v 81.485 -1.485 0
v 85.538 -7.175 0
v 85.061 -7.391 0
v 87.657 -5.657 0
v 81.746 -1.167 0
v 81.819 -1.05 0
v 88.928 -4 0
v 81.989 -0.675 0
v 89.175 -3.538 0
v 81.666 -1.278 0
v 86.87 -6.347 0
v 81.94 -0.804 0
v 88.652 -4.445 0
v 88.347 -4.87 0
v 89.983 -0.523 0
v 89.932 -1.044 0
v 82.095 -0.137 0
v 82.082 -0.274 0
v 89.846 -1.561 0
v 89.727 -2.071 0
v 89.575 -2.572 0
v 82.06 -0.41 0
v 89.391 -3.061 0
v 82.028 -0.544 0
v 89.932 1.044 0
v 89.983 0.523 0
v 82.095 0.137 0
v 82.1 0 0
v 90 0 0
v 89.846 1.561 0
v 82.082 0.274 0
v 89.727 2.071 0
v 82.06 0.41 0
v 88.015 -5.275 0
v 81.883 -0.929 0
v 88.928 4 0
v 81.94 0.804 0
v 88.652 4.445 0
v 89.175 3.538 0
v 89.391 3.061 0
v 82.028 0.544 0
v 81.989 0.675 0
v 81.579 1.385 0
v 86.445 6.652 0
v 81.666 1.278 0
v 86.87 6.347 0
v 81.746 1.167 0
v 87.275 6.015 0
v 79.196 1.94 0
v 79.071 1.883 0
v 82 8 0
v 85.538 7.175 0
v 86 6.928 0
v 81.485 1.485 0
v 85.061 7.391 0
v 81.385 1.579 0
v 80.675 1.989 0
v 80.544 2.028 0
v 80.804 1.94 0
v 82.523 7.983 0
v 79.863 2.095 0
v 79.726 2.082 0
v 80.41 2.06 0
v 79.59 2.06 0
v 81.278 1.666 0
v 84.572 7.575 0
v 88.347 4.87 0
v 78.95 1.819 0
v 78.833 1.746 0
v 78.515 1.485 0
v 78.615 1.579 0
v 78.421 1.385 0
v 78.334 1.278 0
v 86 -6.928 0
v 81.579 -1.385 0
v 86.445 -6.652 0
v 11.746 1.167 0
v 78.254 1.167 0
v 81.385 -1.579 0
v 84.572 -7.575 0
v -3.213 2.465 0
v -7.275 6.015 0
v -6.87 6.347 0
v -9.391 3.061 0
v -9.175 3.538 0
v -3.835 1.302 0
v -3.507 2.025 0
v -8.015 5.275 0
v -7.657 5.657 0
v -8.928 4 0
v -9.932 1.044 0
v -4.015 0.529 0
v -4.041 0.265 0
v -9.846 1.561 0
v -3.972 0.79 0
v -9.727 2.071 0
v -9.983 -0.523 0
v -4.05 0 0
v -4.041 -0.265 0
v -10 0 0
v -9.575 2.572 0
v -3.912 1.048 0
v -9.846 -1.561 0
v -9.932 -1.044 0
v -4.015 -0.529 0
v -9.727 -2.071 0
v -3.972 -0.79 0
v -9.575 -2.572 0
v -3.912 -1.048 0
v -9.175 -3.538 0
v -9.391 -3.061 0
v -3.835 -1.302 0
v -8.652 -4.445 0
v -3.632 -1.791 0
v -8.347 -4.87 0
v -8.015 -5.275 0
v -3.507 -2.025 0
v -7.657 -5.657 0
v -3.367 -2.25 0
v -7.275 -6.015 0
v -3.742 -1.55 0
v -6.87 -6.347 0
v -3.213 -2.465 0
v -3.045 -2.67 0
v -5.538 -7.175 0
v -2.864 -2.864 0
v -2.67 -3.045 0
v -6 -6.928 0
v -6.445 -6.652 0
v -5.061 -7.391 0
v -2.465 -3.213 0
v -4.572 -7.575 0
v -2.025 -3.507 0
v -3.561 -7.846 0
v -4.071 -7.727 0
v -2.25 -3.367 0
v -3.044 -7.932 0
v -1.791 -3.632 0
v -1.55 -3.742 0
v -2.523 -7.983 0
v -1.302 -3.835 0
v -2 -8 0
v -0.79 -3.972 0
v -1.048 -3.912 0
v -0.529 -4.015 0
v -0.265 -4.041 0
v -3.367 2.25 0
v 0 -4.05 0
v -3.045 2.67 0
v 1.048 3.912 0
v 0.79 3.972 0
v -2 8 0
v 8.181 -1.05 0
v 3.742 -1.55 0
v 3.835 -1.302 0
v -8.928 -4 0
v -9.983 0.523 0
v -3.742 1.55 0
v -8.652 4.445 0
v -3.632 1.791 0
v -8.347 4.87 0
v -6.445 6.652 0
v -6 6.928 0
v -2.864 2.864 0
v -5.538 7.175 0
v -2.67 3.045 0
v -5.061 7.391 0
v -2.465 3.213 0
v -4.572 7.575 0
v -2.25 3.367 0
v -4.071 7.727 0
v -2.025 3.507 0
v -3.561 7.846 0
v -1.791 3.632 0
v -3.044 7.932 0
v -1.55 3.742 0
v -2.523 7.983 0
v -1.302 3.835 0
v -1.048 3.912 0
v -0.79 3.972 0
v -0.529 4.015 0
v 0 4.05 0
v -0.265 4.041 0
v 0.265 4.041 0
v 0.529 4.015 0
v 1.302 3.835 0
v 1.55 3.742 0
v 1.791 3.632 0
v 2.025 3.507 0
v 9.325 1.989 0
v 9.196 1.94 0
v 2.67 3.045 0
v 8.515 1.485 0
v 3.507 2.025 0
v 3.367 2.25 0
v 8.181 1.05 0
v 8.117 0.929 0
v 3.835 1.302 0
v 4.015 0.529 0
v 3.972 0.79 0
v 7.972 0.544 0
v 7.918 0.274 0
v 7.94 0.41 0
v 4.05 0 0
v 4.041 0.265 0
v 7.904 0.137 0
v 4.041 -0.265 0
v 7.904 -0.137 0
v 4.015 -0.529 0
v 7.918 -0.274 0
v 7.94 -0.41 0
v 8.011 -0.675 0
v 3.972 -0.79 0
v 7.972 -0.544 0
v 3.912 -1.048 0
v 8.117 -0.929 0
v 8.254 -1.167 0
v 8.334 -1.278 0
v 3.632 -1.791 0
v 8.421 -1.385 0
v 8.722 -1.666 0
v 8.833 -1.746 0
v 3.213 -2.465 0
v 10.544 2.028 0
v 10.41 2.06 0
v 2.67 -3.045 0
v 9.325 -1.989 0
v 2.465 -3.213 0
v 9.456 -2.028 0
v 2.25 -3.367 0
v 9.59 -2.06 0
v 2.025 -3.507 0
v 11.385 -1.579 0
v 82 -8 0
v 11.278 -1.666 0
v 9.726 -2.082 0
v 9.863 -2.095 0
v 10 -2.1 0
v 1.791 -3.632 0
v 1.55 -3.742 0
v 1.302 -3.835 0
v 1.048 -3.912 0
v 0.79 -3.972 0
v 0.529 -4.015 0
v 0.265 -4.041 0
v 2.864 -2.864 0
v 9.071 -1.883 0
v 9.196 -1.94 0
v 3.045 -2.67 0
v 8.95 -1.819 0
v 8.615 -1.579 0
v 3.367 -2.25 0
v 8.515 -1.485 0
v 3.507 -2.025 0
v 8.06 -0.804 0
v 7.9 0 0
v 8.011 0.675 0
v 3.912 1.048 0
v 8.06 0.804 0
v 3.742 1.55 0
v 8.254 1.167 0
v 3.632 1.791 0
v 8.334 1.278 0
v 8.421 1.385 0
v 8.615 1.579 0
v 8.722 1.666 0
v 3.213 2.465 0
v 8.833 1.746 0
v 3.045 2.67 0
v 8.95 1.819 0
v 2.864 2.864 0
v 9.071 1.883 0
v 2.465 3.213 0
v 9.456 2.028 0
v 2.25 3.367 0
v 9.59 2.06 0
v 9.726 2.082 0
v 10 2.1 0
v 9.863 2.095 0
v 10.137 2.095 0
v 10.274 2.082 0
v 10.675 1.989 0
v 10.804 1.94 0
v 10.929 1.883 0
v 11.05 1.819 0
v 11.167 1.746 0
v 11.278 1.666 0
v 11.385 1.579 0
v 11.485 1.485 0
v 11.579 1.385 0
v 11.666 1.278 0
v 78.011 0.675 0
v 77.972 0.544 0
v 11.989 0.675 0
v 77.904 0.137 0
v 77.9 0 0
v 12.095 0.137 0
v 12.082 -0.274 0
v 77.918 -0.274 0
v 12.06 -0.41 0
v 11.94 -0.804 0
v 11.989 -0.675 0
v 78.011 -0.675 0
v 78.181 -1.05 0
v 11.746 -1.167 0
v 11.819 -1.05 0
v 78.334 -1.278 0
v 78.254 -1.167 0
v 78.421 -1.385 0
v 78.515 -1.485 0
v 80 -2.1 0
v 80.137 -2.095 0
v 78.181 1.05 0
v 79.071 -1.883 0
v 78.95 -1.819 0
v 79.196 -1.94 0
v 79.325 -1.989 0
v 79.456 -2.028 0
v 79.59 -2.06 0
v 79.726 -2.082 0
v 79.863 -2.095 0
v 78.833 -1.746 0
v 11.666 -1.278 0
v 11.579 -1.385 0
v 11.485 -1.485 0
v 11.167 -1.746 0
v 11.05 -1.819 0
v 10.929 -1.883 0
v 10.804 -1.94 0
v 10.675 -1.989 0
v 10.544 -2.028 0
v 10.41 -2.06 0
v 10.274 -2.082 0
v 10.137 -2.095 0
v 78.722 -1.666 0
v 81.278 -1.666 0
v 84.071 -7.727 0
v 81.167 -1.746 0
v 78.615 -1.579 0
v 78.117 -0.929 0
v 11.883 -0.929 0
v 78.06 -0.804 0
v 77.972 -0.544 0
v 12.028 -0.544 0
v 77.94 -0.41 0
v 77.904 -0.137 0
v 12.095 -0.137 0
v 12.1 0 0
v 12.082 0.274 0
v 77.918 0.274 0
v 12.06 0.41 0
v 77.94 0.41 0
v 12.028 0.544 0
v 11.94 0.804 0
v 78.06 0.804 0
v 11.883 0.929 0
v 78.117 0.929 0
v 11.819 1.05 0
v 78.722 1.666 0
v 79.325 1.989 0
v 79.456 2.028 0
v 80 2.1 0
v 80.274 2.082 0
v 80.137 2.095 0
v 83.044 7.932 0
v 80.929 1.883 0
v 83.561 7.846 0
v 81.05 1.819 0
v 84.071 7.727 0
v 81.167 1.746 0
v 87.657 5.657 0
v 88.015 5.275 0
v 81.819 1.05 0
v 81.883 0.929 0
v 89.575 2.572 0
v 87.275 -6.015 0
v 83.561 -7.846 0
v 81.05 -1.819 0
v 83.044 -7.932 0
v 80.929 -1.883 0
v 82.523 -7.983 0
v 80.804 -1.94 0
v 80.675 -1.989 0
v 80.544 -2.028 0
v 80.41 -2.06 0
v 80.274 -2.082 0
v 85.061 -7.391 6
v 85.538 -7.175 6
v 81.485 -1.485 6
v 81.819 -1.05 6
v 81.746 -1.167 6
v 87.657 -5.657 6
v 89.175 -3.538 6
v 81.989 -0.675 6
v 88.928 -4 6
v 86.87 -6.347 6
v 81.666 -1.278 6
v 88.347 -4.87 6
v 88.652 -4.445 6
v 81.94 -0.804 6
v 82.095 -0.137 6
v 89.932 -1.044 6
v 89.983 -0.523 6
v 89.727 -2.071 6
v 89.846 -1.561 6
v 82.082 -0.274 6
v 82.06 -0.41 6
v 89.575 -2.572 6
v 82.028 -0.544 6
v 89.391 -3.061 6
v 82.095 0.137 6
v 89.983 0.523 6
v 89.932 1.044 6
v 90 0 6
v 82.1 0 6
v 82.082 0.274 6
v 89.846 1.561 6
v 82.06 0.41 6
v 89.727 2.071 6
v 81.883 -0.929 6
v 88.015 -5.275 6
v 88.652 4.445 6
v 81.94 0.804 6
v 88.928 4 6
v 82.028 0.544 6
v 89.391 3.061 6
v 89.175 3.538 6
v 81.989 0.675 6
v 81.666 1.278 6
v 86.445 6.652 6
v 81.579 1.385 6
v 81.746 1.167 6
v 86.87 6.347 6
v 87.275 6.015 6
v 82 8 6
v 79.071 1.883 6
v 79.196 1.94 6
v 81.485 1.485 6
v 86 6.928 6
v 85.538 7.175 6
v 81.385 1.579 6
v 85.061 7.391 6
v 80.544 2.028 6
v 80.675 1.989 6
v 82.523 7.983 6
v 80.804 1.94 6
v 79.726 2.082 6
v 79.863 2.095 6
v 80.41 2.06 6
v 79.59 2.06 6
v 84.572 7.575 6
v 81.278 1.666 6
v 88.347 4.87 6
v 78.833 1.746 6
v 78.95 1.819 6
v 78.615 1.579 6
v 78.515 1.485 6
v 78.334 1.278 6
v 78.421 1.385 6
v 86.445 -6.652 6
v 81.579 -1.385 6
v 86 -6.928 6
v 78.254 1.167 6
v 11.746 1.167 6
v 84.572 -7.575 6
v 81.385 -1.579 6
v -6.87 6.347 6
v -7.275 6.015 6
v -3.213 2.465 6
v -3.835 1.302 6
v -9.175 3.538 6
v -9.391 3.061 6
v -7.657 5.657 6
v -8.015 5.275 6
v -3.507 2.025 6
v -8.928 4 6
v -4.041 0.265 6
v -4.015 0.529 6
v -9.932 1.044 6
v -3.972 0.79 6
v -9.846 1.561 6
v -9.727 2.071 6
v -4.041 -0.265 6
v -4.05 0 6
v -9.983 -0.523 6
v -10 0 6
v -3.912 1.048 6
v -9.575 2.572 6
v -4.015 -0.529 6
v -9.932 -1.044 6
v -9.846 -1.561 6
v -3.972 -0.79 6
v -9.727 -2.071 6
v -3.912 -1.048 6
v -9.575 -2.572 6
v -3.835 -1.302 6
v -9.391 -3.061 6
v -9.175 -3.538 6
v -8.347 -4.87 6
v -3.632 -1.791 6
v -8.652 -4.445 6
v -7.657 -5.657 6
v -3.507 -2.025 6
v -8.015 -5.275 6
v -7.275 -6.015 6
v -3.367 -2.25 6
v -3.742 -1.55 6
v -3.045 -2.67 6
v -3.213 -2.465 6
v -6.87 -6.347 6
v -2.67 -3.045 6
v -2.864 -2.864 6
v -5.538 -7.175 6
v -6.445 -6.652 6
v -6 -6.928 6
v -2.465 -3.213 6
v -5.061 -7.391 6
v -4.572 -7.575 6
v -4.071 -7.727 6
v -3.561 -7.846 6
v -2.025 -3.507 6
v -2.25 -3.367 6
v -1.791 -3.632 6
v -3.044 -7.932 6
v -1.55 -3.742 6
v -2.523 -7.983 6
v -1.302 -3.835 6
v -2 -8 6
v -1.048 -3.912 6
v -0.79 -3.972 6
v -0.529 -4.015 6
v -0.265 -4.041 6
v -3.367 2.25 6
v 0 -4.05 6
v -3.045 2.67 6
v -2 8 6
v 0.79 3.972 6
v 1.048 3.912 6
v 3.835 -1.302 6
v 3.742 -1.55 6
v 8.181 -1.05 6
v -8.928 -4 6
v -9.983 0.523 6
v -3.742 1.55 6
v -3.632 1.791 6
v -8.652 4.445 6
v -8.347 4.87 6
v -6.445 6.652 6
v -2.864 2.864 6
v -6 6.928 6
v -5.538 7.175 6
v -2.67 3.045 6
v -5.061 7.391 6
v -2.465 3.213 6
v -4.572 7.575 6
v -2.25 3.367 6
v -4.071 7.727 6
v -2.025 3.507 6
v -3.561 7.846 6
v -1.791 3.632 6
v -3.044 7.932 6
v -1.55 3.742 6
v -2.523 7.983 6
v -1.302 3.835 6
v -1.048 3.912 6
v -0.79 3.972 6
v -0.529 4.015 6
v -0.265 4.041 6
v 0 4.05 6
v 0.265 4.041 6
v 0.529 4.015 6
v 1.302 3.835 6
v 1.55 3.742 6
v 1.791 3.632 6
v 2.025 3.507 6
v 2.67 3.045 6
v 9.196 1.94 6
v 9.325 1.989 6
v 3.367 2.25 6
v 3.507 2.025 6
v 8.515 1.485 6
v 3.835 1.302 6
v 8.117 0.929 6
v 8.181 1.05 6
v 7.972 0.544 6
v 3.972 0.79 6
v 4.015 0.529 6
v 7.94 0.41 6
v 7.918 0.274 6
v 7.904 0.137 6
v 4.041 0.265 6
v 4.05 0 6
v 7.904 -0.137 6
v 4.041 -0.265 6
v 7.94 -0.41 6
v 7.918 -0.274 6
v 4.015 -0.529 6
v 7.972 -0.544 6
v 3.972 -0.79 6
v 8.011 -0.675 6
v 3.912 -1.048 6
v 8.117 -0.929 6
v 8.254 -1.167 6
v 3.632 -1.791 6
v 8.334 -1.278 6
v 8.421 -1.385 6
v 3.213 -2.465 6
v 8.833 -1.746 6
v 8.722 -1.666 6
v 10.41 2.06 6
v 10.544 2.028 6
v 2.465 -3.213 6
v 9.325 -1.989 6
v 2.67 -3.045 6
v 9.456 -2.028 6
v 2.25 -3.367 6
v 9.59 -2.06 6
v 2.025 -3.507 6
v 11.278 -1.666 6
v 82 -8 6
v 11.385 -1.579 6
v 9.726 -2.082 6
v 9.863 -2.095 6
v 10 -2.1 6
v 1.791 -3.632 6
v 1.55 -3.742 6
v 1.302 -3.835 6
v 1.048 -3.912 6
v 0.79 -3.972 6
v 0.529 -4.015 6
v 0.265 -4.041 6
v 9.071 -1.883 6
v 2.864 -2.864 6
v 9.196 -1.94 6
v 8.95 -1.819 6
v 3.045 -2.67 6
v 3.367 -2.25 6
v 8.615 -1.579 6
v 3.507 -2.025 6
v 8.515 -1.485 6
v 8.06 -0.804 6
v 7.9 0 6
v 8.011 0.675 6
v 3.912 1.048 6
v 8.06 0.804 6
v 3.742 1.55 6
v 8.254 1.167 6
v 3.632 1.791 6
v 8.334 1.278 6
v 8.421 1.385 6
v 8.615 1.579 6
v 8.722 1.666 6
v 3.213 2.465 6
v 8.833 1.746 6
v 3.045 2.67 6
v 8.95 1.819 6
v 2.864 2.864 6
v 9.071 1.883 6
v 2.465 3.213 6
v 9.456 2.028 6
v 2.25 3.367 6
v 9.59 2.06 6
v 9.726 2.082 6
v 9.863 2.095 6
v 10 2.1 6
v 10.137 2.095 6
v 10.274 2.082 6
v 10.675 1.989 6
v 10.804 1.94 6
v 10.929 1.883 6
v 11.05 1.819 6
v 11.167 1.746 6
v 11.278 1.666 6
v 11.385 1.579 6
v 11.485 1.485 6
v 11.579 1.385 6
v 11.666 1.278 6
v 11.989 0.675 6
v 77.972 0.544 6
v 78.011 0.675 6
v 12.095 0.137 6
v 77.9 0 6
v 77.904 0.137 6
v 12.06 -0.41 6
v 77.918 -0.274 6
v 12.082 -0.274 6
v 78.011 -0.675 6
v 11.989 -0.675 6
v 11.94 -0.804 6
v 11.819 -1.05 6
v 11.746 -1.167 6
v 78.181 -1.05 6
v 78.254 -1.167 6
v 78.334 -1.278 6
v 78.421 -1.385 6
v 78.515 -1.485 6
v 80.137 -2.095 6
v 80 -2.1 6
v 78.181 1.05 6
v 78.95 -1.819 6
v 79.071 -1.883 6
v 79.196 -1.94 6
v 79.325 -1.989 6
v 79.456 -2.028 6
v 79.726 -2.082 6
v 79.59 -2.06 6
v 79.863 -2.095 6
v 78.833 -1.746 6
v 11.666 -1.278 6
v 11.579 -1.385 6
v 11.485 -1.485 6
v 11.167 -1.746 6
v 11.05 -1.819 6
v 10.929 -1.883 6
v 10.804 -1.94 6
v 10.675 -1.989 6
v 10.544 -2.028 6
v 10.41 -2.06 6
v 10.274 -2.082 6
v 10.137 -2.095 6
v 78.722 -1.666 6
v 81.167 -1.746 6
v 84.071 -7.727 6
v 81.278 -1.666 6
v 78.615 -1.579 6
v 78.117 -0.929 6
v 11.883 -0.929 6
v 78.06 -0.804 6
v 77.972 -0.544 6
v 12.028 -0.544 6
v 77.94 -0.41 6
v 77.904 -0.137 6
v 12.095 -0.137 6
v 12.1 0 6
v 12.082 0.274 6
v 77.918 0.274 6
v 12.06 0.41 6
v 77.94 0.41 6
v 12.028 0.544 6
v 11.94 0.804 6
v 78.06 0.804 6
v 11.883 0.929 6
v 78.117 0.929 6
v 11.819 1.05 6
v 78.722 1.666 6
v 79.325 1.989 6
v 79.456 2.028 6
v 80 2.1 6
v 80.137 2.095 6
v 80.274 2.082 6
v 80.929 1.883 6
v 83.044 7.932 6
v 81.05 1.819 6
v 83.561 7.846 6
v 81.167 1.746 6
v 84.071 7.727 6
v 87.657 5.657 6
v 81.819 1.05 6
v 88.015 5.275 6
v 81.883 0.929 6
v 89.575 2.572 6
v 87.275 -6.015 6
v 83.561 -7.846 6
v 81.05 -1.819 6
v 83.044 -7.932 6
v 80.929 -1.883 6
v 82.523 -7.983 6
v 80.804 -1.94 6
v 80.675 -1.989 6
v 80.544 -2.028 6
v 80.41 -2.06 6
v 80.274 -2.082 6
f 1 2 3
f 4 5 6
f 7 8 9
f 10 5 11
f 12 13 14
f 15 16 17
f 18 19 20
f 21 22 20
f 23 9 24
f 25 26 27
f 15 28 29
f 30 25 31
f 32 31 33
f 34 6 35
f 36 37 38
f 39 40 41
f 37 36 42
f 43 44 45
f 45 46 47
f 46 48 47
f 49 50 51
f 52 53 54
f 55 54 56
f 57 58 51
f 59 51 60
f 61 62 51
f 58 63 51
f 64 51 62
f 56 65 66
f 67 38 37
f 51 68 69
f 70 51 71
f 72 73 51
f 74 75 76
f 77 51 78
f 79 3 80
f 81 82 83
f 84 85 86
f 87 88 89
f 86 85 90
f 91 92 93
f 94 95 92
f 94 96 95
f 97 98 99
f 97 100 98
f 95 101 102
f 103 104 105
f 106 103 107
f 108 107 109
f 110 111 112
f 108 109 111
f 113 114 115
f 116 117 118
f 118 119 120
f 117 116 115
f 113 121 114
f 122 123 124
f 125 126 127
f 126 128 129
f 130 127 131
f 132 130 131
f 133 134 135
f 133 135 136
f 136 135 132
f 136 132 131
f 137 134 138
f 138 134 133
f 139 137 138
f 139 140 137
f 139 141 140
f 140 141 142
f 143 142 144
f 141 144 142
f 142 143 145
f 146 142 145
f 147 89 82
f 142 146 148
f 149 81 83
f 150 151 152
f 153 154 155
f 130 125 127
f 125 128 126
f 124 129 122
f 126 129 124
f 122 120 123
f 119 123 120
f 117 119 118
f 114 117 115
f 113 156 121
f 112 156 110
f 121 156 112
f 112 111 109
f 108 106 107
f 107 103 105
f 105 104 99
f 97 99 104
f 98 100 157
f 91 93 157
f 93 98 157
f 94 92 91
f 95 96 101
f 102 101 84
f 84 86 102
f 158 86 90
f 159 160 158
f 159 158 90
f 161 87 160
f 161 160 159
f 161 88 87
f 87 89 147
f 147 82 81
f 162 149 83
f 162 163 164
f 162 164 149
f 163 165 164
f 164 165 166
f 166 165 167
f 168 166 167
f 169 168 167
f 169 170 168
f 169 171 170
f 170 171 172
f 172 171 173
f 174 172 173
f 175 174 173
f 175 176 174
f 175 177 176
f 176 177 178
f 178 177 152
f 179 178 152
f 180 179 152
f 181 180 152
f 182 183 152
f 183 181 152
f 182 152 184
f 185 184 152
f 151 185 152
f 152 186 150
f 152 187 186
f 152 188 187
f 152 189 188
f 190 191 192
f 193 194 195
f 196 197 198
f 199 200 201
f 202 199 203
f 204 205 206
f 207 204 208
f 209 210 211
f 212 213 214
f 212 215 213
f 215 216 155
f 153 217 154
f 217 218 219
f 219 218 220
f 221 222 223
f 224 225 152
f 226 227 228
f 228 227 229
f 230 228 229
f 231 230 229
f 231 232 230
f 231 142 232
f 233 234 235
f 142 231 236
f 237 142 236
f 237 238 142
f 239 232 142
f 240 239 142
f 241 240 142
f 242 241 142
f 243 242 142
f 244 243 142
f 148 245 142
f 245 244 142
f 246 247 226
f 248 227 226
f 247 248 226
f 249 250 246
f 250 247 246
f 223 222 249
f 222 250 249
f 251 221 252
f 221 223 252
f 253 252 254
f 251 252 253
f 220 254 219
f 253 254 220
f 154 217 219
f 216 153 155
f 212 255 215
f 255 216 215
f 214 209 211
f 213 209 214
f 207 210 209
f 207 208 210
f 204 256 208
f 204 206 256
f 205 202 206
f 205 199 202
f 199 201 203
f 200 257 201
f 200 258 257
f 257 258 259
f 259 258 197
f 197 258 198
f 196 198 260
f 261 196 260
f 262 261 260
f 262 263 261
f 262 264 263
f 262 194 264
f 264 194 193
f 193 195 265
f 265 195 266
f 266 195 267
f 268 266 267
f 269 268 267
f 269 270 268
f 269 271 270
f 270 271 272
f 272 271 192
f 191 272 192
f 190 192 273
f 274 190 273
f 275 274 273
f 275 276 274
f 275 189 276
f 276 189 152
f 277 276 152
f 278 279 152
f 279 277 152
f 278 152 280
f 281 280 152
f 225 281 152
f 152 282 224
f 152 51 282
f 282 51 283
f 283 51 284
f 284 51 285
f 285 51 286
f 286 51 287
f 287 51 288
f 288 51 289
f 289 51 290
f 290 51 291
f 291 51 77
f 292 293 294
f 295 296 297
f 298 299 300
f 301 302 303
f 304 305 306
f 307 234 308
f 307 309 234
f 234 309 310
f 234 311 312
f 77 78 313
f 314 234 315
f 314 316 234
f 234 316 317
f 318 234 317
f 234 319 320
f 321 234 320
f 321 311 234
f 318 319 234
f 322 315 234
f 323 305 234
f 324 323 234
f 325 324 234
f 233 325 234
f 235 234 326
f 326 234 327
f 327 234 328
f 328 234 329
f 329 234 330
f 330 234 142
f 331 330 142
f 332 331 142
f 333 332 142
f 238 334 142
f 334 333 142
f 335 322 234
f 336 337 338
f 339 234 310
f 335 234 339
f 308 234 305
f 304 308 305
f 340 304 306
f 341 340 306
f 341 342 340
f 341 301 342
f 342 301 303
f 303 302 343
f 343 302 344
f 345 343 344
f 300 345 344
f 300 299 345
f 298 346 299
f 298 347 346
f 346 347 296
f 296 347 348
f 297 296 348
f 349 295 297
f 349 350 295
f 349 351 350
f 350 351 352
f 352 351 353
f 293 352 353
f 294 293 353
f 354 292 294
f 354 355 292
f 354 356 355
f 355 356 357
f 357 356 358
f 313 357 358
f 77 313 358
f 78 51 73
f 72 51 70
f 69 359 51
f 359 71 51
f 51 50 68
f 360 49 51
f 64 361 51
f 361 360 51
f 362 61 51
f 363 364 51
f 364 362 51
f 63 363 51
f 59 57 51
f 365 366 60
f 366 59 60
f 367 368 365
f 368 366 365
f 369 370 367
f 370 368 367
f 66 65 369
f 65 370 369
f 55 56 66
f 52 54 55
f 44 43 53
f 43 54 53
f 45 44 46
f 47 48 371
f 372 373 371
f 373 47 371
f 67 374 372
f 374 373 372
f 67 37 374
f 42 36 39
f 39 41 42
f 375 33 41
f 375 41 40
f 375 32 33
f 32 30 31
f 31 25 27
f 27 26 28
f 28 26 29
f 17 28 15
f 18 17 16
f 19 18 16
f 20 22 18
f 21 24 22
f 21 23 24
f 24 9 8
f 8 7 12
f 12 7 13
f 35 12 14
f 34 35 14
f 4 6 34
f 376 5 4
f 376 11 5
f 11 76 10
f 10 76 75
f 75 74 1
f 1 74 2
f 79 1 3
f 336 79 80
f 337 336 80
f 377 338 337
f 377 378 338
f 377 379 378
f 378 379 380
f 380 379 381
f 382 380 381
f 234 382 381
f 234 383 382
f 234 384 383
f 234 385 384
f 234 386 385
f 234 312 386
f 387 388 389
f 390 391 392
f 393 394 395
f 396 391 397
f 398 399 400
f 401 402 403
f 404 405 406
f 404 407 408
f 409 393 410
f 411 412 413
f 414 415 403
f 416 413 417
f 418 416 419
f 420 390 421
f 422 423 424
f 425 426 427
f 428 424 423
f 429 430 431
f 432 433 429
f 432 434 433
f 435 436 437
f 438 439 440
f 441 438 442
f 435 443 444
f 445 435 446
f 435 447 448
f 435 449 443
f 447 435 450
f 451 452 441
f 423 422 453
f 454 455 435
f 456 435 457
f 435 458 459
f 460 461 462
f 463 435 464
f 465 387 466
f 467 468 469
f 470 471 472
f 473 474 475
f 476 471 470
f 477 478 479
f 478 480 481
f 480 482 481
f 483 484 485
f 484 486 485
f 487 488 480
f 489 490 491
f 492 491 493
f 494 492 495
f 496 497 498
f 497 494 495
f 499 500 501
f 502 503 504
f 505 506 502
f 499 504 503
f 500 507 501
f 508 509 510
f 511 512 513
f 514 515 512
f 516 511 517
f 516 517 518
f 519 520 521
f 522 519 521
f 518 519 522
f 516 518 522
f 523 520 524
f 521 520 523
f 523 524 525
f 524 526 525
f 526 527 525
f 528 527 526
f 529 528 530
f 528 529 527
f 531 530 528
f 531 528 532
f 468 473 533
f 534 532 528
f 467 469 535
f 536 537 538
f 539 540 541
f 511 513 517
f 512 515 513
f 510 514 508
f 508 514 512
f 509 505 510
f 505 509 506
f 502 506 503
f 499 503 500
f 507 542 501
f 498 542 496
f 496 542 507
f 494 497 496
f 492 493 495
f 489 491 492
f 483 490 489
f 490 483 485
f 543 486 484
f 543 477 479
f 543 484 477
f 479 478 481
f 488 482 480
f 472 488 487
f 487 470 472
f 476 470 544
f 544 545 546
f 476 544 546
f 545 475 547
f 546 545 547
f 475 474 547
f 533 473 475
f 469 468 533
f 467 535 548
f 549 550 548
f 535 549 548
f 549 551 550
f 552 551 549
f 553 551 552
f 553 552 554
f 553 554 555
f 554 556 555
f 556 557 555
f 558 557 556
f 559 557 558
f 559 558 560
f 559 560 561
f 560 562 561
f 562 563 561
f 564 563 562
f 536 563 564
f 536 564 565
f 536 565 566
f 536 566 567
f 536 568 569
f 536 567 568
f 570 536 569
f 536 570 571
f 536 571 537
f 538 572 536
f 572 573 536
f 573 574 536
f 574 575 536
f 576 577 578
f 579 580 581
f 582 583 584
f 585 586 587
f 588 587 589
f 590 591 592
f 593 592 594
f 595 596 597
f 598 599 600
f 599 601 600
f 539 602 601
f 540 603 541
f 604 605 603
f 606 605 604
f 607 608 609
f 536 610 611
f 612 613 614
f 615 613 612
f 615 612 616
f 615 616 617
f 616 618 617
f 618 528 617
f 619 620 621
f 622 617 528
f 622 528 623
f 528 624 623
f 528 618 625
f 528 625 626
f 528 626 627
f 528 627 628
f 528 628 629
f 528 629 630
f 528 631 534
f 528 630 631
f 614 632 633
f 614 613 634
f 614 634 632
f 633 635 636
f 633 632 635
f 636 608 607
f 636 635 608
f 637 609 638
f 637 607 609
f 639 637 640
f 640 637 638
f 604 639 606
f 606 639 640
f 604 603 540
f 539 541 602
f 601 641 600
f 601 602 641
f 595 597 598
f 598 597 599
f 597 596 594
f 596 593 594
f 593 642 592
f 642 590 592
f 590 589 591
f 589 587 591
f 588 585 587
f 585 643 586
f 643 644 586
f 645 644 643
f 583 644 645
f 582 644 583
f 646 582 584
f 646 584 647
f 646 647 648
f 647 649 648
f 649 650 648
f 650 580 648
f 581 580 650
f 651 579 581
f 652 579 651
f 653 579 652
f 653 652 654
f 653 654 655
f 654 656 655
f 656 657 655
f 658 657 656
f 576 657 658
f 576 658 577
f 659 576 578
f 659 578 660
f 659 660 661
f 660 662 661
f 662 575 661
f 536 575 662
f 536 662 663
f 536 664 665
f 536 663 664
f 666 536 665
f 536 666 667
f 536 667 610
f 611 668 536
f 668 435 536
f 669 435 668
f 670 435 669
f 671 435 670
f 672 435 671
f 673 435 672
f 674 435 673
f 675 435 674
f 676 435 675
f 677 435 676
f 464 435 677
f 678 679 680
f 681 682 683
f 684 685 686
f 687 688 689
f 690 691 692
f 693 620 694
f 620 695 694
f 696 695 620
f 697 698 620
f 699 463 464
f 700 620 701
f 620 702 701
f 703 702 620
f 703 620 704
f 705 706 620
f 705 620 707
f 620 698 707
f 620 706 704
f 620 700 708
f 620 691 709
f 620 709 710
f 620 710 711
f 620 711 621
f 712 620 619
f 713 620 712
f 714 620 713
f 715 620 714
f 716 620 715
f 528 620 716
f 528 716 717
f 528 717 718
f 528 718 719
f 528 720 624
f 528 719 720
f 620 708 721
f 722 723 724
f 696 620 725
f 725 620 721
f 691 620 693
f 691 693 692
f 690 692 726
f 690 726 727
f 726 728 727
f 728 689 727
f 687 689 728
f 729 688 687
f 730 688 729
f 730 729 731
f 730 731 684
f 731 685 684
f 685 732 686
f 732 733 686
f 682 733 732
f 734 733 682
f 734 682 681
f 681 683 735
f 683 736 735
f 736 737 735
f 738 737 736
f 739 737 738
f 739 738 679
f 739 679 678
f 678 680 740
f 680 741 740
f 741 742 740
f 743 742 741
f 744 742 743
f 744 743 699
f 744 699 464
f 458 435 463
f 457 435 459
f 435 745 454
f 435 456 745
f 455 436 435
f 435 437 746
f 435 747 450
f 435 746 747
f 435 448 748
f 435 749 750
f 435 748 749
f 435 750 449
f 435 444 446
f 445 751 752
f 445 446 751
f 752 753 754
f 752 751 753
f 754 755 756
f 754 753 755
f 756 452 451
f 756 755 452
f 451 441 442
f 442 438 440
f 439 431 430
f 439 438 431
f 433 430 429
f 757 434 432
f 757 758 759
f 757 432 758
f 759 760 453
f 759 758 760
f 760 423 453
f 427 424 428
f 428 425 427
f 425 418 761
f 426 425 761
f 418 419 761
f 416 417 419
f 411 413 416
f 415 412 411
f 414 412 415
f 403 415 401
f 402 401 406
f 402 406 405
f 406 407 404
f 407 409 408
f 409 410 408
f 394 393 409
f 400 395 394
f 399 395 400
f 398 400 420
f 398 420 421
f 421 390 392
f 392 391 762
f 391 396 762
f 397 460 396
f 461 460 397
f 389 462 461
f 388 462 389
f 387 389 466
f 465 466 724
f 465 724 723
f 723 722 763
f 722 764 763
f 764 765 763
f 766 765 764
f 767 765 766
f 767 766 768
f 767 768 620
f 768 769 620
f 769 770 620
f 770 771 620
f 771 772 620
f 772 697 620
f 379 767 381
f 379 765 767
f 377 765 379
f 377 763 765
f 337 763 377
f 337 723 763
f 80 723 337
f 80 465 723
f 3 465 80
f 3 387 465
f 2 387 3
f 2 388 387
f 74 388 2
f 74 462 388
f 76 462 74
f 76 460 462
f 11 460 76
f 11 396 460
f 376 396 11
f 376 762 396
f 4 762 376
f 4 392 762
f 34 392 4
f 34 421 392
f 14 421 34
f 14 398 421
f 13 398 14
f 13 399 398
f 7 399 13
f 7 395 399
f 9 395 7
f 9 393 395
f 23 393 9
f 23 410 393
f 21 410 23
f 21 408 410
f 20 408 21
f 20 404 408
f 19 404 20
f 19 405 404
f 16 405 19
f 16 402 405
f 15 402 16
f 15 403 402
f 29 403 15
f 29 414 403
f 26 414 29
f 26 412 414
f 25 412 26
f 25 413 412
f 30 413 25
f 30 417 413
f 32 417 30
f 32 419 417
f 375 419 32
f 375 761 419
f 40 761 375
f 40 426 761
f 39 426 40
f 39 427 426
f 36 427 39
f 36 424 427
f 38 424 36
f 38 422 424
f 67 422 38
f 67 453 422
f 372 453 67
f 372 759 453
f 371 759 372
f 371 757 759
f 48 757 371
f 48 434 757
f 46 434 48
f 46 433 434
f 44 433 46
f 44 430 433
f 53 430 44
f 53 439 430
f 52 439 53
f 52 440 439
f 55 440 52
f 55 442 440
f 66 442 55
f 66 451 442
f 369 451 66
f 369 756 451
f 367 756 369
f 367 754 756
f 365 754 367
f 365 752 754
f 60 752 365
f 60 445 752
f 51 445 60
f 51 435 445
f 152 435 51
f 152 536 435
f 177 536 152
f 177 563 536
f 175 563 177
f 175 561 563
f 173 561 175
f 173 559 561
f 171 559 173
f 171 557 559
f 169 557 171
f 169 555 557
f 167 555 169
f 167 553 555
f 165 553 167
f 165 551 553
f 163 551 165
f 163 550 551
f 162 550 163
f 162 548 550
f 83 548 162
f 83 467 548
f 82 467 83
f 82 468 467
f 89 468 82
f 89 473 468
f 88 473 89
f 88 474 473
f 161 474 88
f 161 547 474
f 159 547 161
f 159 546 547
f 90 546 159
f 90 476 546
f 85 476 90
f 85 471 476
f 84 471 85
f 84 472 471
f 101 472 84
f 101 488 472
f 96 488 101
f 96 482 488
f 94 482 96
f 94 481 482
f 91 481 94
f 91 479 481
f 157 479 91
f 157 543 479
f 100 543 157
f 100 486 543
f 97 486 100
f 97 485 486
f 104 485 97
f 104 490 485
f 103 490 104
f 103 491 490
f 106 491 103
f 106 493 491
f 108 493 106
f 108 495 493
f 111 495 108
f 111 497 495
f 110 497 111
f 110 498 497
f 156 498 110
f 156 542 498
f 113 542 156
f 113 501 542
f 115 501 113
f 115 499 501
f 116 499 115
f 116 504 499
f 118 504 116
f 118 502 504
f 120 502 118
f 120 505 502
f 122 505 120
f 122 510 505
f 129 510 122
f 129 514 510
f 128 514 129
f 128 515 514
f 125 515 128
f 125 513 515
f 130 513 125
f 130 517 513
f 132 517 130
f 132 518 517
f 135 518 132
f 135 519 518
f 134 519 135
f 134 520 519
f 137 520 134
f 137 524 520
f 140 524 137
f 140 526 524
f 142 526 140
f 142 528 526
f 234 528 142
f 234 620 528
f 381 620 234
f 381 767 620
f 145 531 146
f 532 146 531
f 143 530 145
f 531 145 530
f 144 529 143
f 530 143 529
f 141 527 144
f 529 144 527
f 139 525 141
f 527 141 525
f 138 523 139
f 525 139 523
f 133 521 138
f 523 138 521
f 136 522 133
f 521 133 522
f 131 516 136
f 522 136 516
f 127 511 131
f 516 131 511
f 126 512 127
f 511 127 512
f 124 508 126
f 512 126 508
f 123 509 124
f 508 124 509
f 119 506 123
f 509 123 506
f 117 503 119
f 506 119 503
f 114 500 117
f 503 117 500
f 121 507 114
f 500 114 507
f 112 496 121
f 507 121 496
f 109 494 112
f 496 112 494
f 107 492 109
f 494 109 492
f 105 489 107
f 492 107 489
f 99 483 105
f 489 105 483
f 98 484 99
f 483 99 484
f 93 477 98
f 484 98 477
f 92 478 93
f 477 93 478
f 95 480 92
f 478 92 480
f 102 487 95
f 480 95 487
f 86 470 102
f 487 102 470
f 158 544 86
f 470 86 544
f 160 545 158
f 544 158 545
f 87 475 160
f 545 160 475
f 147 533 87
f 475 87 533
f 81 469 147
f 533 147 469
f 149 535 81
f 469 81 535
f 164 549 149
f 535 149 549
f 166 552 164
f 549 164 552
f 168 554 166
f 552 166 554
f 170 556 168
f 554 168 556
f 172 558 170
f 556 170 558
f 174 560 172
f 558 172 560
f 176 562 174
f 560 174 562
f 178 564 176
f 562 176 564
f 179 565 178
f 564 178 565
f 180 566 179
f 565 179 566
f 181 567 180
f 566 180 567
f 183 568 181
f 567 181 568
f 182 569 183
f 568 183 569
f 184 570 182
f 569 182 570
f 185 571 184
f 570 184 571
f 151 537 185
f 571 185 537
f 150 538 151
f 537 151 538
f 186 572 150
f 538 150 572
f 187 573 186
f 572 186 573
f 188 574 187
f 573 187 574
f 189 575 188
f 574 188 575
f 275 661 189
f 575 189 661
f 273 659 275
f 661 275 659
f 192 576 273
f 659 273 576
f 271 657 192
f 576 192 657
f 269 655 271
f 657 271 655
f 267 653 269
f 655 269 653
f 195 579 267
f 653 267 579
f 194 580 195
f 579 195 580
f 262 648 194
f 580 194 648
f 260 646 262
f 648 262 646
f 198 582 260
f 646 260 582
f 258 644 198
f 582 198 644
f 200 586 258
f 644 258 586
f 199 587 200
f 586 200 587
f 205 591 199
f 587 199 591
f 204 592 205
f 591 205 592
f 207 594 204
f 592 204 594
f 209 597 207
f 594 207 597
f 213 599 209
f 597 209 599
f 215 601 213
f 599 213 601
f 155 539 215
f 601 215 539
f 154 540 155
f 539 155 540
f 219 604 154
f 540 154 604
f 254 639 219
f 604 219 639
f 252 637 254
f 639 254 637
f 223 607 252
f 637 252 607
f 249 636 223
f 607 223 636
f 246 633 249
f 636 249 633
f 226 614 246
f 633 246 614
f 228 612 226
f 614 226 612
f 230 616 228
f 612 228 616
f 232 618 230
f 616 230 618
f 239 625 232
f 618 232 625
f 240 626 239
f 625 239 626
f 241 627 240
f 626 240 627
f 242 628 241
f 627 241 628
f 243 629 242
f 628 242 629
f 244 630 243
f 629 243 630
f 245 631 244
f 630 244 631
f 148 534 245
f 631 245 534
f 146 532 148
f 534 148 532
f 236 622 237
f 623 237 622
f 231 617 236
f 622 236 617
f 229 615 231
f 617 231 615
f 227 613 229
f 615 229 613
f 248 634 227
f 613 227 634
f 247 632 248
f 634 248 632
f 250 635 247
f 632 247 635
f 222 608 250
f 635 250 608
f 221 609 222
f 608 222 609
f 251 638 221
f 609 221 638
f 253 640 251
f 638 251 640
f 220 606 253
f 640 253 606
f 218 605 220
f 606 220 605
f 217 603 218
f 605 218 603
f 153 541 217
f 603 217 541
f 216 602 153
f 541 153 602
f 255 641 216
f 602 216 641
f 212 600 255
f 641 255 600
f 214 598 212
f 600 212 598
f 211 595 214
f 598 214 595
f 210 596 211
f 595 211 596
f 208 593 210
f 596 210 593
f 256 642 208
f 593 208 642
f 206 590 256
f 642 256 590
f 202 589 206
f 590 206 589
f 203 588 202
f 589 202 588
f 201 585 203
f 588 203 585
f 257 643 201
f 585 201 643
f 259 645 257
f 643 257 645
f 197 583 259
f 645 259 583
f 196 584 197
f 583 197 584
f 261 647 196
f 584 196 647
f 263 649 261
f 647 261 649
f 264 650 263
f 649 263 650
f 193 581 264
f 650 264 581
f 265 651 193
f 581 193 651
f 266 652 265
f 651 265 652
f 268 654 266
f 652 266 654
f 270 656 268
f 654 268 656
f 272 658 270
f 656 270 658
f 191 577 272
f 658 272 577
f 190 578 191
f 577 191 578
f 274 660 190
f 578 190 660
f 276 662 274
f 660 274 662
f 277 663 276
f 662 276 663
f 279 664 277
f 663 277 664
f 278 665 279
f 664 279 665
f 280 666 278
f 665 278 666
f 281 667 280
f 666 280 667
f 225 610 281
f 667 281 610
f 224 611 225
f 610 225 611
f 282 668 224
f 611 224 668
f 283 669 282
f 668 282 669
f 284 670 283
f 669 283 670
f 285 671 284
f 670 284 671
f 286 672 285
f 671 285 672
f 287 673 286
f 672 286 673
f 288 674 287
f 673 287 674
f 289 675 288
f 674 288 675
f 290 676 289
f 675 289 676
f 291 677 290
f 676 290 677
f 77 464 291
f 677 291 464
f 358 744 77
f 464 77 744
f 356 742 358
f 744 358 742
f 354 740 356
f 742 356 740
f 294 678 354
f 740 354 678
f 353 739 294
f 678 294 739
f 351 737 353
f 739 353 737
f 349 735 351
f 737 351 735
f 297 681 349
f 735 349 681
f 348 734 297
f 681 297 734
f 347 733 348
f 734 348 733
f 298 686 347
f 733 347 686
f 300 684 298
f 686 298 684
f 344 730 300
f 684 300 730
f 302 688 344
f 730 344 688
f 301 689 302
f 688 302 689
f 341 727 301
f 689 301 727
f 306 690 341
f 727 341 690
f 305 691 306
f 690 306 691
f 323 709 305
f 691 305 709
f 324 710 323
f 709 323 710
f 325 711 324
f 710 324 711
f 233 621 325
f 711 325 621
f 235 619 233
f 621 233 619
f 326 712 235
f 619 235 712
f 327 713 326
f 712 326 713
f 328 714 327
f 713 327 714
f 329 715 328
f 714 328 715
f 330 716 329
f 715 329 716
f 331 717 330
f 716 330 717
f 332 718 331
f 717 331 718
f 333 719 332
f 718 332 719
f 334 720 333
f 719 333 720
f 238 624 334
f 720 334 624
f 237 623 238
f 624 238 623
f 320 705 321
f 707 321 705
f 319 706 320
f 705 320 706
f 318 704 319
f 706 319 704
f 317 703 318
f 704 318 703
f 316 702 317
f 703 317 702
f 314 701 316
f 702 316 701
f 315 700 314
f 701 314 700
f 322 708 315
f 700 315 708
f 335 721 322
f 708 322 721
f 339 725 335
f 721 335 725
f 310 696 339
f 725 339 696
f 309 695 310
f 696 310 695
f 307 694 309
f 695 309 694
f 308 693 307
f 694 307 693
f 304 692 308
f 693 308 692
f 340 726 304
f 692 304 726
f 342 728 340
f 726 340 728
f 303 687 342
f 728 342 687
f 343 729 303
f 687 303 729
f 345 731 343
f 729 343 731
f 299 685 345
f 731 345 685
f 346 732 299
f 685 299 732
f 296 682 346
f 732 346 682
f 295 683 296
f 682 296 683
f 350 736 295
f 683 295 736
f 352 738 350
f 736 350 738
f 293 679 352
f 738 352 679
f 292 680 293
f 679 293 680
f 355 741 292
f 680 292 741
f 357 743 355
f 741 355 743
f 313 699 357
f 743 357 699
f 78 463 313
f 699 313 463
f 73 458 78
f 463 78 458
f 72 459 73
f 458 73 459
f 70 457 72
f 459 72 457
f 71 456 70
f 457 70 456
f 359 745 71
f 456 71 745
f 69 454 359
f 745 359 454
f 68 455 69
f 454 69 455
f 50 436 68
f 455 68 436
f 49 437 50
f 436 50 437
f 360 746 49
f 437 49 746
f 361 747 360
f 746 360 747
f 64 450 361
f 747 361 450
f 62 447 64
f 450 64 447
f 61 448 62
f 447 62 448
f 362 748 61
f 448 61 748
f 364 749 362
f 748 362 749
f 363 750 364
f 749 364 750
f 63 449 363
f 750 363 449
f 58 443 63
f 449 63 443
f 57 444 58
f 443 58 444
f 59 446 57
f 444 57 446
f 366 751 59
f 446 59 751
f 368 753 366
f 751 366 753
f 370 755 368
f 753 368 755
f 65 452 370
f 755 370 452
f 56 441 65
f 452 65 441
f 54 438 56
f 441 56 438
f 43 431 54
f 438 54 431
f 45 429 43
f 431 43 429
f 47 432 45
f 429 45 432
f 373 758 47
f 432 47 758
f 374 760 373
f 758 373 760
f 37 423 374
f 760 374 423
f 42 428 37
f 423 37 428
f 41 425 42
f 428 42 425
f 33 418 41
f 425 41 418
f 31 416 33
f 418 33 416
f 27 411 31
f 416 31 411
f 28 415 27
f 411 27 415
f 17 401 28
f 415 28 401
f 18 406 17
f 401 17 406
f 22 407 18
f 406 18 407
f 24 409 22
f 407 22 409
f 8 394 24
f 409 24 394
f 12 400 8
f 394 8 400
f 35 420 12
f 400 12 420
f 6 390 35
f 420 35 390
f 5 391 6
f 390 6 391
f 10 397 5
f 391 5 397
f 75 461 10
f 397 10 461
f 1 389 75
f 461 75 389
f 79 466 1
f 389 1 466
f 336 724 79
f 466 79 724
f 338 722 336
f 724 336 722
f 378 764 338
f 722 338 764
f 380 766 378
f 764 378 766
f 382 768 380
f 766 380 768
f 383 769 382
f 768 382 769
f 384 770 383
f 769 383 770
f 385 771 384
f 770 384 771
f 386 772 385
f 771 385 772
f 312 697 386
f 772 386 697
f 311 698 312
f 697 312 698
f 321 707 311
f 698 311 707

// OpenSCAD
// Flat 8:1 link lever, dimensions in mm. Laser-cut or machine from steel.
// Both links are on the same side of the pivot for same-direction travel.
// Printed copies are layout templates. Use a steel part for loaded trials.

width = 16;
thickness = 6;
pivot_diameter = 8.1;
link_diameter = 4.2;
carriage_radius = 10;
grip_radius = 80;
end_radius = width / 2;
$fn = 96;

linear_extrude(thickness)
    difference() {
        hull() {
            translate([-2, 0]) circle(r = end_radius);
            translate([grip_radius + 2, 0]) circle(r = end_radius);
        }

        circle(d = pivot_diameter);
        translate([carriage_radius, 0]) circle(d = link_diameter);
        translate([grip_radius, 0]) circle(d = link_diameter);
    }
